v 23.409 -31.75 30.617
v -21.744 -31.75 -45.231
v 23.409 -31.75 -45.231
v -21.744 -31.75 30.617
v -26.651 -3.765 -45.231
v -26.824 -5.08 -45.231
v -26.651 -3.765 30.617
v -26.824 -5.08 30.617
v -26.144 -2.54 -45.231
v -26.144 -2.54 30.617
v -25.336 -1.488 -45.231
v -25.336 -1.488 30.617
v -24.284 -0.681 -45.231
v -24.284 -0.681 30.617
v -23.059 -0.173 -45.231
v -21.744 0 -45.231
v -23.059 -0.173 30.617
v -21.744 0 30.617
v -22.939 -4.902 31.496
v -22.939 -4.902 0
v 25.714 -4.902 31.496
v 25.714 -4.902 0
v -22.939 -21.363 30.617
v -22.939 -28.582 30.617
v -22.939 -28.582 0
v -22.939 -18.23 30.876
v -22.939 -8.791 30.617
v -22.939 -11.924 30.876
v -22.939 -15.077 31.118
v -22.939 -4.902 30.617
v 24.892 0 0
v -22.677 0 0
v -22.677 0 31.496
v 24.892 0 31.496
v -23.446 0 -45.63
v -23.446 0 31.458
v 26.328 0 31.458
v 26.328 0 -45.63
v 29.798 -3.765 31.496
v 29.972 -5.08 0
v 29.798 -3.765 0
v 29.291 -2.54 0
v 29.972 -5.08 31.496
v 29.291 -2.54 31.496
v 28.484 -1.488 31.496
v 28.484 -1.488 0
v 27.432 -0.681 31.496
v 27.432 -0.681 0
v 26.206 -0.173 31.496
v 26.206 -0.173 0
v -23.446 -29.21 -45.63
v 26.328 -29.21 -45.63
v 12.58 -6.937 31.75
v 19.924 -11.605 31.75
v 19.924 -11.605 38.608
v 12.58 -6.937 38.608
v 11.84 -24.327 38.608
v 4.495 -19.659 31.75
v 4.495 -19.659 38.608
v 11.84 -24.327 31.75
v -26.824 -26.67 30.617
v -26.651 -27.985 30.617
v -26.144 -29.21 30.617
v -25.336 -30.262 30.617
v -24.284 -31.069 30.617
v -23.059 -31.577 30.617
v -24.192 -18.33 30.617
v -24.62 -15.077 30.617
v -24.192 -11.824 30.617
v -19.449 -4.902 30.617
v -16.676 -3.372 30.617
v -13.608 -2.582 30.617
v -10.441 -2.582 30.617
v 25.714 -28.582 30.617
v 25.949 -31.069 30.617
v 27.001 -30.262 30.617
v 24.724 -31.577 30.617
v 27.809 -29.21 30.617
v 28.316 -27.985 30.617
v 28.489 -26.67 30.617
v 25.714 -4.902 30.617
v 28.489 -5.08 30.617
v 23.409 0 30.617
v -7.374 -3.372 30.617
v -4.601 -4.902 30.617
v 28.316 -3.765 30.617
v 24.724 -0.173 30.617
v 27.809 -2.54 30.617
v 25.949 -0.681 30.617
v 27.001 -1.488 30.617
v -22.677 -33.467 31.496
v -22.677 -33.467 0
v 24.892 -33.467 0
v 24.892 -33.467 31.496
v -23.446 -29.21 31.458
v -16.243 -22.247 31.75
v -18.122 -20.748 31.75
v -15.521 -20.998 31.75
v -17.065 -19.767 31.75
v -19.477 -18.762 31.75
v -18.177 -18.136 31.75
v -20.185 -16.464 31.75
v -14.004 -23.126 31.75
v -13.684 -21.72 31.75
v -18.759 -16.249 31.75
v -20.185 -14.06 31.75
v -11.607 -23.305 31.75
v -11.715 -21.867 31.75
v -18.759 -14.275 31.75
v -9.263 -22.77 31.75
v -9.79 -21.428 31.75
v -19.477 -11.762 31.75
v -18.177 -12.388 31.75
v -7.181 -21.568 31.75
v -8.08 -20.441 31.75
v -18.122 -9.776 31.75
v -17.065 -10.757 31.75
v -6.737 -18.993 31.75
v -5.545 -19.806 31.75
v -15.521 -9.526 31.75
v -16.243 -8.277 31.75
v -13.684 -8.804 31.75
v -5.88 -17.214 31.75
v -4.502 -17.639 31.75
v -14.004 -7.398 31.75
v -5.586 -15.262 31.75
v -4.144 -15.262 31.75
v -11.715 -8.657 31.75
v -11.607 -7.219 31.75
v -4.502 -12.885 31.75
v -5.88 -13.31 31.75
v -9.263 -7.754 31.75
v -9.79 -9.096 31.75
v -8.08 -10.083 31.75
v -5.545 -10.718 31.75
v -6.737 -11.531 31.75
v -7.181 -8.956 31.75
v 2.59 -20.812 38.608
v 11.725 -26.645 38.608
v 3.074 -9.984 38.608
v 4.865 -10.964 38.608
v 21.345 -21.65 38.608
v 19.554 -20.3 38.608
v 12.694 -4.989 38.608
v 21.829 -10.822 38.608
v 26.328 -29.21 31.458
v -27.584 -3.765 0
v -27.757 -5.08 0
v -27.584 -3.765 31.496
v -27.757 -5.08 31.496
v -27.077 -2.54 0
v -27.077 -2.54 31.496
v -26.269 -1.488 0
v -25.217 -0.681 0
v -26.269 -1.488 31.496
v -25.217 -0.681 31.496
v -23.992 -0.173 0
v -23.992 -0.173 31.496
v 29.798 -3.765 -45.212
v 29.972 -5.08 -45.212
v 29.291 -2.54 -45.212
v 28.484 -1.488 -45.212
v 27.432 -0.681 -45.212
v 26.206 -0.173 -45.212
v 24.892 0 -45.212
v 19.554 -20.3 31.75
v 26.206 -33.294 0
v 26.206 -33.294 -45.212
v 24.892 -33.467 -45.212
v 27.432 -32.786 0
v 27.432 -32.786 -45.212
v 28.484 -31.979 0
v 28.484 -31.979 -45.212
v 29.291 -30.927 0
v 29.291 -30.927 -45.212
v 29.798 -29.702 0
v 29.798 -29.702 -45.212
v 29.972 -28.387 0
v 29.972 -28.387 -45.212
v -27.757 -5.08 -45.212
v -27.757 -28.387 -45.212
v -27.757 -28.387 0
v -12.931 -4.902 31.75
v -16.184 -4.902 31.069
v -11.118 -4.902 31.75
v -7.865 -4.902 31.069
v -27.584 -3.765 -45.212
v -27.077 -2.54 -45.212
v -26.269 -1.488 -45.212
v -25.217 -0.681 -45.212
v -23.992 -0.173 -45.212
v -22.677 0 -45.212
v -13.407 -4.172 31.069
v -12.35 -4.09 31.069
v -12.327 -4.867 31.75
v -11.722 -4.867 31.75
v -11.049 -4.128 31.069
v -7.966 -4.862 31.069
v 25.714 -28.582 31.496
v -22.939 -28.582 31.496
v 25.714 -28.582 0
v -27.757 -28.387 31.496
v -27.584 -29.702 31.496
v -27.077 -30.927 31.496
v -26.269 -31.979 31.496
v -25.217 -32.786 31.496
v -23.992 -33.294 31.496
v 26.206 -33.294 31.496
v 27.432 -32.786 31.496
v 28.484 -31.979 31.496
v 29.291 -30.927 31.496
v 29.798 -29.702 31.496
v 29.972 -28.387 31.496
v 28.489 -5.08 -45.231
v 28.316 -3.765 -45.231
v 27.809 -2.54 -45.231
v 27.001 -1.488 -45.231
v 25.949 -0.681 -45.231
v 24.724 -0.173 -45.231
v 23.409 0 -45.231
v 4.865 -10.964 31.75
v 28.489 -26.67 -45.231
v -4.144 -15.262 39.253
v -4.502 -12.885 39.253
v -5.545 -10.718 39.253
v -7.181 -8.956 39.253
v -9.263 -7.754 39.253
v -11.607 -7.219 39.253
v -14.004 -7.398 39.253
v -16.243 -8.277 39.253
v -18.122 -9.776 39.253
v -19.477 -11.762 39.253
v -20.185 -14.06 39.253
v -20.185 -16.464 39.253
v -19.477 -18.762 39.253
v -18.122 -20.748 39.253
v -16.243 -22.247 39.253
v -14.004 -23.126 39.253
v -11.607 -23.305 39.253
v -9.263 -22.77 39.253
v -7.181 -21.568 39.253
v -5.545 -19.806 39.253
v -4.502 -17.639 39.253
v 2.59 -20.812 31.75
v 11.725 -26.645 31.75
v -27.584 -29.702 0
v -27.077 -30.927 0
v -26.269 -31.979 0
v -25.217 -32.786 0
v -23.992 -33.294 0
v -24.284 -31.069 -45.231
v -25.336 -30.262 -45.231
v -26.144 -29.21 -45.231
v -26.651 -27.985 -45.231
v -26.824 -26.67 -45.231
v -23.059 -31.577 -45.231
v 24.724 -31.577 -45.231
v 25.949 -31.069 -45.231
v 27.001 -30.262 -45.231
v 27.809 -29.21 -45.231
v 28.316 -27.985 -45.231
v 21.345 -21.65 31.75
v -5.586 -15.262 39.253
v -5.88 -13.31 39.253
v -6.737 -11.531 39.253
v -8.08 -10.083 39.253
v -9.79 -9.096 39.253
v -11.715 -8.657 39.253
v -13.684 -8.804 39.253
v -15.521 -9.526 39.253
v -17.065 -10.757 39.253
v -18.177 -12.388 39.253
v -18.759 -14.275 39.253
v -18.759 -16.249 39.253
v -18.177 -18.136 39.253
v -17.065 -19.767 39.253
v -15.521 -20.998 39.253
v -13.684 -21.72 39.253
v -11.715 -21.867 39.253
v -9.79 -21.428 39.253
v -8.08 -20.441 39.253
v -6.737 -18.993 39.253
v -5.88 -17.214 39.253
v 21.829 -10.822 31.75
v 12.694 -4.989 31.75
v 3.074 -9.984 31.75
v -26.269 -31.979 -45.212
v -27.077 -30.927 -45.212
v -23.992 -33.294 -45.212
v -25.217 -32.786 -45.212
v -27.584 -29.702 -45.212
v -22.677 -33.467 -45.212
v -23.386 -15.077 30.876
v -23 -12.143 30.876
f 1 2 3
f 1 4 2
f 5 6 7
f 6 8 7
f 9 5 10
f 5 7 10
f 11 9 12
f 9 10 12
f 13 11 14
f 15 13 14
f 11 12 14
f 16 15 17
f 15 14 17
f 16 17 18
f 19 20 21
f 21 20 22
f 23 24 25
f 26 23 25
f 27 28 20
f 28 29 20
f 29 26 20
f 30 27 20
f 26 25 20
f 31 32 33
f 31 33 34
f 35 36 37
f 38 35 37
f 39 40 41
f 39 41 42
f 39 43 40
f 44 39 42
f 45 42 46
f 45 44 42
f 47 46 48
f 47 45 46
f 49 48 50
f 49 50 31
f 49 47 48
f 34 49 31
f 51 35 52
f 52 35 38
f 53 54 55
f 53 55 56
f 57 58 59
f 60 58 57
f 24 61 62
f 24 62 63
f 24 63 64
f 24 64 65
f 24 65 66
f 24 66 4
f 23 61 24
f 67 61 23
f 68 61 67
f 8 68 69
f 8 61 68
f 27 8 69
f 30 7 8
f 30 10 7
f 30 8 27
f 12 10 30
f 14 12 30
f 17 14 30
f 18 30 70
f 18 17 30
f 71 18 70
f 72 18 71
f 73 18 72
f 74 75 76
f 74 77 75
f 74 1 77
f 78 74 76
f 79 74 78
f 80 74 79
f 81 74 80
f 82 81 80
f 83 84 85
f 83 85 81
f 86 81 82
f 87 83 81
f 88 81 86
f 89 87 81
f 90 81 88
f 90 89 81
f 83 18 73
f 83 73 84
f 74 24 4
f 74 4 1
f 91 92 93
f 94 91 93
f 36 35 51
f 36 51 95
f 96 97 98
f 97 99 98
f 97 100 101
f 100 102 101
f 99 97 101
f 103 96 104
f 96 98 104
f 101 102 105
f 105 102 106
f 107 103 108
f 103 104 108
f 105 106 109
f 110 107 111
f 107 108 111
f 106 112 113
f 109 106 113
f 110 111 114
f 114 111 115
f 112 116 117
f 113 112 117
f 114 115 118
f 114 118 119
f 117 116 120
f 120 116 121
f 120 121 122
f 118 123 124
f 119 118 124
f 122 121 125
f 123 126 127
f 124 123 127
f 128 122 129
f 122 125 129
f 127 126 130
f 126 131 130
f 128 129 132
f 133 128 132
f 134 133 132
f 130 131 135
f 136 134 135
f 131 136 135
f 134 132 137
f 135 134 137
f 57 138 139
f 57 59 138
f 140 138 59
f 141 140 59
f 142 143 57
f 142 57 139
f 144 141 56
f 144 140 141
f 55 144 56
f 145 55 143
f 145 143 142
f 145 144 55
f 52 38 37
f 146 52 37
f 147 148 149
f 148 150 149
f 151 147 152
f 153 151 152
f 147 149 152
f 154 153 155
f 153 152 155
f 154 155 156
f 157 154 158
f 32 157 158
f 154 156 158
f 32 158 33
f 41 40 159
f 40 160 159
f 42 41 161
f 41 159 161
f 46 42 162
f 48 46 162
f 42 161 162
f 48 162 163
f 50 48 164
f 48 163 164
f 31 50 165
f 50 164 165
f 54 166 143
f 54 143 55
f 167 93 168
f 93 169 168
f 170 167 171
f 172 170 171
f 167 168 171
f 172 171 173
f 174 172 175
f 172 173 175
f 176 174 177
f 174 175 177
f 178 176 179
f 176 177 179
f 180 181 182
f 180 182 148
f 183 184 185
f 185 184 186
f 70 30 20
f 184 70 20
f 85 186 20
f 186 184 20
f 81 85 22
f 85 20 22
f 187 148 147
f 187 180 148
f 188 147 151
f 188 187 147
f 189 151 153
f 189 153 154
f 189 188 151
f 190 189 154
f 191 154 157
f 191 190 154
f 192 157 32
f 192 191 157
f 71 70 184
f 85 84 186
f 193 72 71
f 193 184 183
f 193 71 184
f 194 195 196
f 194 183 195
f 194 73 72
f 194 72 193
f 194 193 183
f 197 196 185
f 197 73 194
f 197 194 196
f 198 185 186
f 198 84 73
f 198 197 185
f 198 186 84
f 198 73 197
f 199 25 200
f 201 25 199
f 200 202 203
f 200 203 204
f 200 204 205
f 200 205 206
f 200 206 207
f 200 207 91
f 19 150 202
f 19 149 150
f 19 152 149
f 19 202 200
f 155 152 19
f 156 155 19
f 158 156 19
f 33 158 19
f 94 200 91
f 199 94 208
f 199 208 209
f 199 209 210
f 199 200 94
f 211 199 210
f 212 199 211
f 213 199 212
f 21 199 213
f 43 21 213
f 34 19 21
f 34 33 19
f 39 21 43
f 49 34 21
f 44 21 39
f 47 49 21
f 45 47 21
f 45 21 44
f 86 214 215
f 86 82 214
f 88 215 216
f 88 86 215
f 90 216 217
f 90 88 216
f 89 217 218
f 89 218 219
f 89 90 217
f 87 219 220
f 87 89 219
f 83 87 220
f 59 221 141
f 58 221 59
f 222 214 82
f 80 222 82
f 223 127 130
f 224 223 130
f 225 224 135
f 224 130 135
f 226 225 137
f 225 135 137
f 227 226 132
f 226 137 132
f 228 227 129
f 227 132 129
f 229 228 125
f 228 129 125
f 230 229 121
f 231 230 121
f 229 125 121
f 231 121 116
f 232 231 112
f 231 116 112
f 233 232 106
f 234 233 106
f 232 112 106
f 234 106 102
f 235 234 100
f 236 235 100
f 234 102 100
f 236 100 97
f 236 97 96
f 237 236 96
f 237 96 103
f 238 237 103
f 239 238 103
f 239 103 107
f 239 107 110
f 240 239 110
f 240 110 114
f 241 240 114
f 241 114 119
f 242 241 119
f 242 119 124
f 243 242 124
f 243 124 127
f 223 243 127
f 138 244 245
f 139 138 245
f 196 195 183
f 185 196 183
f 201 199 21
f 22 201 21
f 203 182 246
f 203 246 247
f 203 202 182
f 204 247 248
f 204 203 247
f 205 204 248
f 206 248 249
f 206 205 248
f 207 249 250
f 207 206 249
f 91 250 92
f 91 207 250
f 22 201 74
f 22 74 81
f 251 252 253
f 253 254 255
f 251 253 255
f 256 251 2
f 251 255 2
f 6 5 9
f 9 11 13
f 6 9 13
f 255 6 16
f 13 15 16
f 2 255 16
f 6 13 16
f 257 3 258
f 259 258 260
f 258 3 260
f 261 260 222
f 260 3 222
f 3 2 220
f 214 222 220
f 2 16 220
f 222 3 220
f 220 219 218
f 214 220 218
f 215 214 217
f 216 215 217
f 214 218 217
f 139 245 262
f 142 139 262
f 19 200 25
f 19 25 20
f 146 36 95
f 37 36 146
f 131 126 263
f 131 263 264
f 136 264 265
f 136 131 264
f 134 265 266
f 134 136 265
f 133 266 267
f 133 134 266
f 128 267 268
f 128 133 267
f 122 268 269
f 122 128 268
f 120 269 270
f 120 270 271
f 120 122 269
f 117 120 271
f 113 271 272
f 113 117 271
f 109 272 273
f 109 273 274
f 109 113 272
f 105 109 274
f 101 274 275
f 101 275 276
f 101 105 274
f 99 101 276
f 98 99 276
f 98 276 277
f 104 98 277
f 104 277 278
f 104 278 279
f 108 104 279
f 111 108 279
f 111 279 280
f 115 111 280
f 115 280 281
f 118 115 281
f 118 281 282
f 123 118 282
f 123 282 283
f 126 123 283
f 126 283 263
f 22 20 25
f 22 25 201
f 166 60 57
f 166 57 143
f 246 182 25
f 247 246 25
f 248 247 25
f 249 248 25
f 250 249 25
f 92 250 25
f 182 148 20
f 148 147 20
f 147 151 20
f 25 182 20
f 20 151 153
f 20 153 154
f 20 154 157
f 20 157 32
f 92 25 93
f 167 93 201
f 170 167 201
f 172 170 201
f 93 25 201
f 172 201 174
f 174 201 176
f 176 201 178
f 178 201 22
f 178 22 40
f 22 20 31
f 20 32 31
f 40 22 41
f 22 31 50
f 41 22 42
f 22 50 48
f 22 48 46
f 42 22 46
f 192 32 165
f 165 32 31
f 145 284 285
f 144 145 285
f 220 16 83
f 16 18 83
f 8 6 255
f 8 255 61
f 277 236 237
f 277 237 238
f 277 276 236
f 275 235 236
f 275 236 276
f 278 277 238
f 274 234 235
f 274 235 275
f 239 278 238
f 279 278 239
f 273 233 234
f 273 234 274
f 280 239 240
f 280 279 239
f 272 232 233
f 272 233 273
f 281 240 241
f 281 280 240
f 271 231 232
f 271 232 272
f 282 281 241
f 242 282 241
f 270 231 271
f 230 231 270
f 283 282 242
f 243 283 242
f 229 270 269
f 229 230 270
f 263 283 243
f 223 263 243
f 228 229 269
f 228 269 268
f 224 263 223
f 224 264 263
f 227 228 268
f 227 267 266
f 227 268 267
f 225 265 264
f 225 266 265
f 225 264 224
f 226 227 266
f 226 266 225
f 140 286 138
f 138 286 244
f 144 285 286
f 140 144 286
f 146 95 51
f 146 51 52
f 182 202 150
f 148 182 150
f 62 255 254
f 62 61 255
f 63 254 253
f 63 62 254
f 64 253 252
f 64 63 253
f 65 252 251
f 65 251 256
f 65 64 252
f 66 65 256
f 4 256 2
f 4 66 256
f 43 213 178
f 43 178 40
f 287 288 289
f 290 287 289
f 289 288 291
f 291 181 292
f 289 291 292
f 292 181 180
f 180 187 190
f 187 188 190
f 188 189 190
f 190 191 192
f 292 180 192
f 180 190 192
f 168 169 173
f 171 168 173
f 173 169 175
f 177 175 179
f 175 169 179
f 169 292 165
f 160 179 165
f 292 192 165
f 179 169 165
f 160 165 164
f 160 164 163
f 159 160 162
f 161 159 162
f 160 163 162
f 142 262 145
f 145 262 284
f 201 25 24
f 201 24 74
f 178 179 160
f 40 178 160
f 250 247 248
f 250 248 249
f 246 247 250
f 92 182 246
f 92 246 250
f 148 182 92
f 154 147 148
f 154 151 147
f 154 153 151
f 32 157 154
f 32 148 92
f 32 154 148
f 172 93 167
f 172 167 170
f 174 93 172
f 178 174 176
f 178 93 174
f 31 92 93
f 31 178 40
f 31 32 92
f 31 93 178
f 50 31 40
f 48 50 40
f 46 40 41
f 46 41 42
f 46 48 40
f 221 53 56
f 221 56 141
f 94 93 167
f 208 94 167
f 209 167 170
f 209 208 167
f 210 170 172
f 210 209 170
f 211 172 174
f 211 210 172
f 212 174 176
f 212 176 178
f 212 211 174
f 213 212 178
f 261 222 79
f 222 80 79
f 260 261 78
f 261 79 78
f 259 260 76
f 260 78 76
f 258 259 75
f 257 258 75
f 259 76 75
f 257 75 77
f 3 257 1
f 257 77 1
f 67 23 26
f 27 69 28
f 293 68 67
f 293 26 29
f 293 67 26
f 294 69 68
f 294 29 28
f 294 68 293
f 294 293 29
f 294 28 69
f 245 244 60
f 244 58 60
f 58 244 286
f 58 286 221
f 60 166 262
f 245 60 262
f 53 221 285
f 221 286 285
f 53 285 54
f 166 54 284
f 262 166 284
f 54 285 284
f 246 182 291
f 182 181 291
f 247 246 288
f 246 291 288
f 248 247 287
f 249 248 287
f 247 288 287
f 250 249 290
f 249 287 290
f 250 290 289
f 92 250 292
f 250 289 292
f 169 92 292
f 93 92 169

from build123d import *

# Parameters (mm, degrees)
F0_W      = 55.313270539
F0_H      = 75.847633183
F1_DEPTH  = 31.75
F2_R      = 5.08
F3_R      = 8.0658325131
F3_R_2    = 6.6237237861
F4_DEPTH  = 8.636
F5_R      = 10.2149655363
F6_DEPTH  = 31.75
F9_DEPTH  = 38.608
F11_DEPTH = 38.862
F13_DEPTH = 27.94
F14_W     = 57.7289052308
F14_H     = 33.4668345749
F15_DEPTH = 31.496
F16_DEPTH = 45.212
F17_R     = 5.08
F17_2_R   = 5.08
F18_W     = 48.6534815282
F18_H     = 23.6792610958
F19_DEPTH = 31.75
F20_W     = 49.7737694532
F20_H     = 77.0872496068
F21_DEPTH = 29.21


# Not quite as in the source:
# - a fillet or chamfer that OpenCascade refuses, or shapes differently, is made with other operations: its cross-section is extruded or revolved along the edge and cut away or added


with BuildPart() as f1:
    # F0 (on Front) → F1 (new body)
    with BuildSketch(Plane.XZ):
        with Locations((0.8324738592, -7.3072724044)):
            Rectangle(F0_W, F0_H)
    extrude(amount=F1_DEPTH)

    # F2
    f2_edges = [f1.edges().sort_by_distance(p)[0] for p in [
        (28.489109, -31.75, -7.307272),
        (-26.824161, -31.75, -7.307272),
        (28.489109, 0, -7.307272),
        (-26.824161, 0, -7.307272),
    ]]
    fillet(f2_edges, radius=F2_R)



with BuildPart() as f4:
    # F3 (on face) → F4 (new body)
    with BuildSketch(Plane.XY.offset(30.6165441871)):
        with Locations((-12.2096184641, -15.2620235458)):
            Circle(F3_R)
        with Locations((-12.2096184641, -15.2620235458)):
            Circle(F3_R_2, mode=Mode.SUBTRACT)
    extrude(amount=F4_DEPTH)


with BuildPart() as f1_1:
    add(f1.part)

    add(f4.part)  # F6 merges F4
    # F5 (on Top) → F6 (join)
    with BuildSketch(Plane.XY):
        with Locations((-12.0246242732, -15.0770293549)):
            Circle(F5_R)
    extrude(amount=F6_DEPTH)

    # F7: fillet of radius 3.0660512242 on 1 edges, made by hand

    # F7_s1 → F7_t2 (revolve)
    with BuildSketch(Plane.XZ.offset(15.0770293549)):
        with BuildLine():
            ThreePointArc((-1.8096587369, 31.75), (-0.7475631061, 30.9143733613), (0.5706238273, 30.6165441871))
            Line((0.5706238273, 30.6165441871), (-1.8096587369, 30.6165441871))
            Line((-1.8096587369, 30.6165441871), (-1.8096587369, 31.75))
        make_face()
    revolve(axis=Axis((-12.0246242732, -15.0770293549, 30.6165441871), (0, 0, -1)))

    # F8 (on Top) → F9 (join)
    with BuildSketch(Plane.XY):
        Polygon((21.3451305674, -21.6504897434), (21.8293182552, -10.8221620321), (12.6938052206, -4.9886793386), (3.0741044982, -9.9835243564), (2.5899168104, -20.8118520677), (11.725429845, -26.6453347612), align=None)
    extrude(amount=F9_DEPTH)

    # F10 (on Top) → F11 (cut)
    with BuildSketch(Plane.XY):
        Polygon((19.9244704443, -11.6050673129), (12.5796077773, -6.9372830912), (4.8647567285, -10.9642286373), (4.4947683466, -19.6589584051), (11.8396310136, -24.3267426267), (19.5544820624, -20.2997970807), align=None)
    extrude(amount=F11_DEPTH, mode=Mode.SUBTRACT)

    # F12 (on Top) → F13 (join)
    with BuildSketch(Plane.XY):
        Polygon((19.2986911239, -20.0054645374), (19.7943821549, -11.7471329868), (12.8903027548, -7.1886861861), (5.4905323236, -10.8885709361), (4.9948412925, -19.1469024867), (11.8989206926, -23.7053492873), align=None)
    extrude(amount=F13_DEPTH)


with BuildPart() as f15:
    # F14 (on Top) → F15 (new body)
    with BuildSketch(Plane.XY):
        with Locations((1.1070892215, -16.7334172875)):
            Rectangle(F14_W, F14_H)
    extrude(amount=F15_DEPTH)

    # F17
    f17_edges = [f15.edges().sort_by_distance(p)[0] for p in [
        (29.971542, -33.466835, 15.748),
        (-27.757363, -33.466835, 15.748),
        (-27.757363, 0, 15.748),
        (29.971542, 0, 15.748),
    ]]
    fillet(f17_edges, radius=F17_R)


with BuildPart() as f16:
    # F14 (on Top) → F16 (new body)
    with BuildSketch(Plane.XY):
        with Locations((1.1070892215, -16.7334172875)):
            Rectangle(F14_W, F14_H)
    extrude(amount=-F16_DEPTH)

    # F17#2
    f17_2_edges = [f16.edges().sort_by_distance(p)[0] for p in [
        (29.971542, -33.466835, -22.606),
        (-27.757363, -33.466835, -22.606),
        (-27.757363, 0, -22.606),
        (29.971542, 0, -22.606),
    ]]
    fillet(f17_2_edges, radius=F17_2_R)


with BuildPart() as f19_tool:
    # F18 (on Top) → F19 (new body)
    with BuildSketch(Plane.XY):
        with Locations((1.3874573633, -16.7419775389)):
            Rectangle(F18_W, F18_H)
    extrude(amount=F19_DEPTH)


with BuildPart() as f1_2:
    add(f1_1.part)

    # F19: cut by f19_tool
    add(f19_tool.part, mode=Mode.SUBTRACT)


with BuildPart() as f15_1:
    add(f15.part)

    # F19: cut by f19_tool
    add(f19_tool.part, mode=Mode.SUBTRACT)


with BuildPart() as f21:
    # F20 (on Front) → F21 (new body)
    with BuildSketch(Plane.XZ):
        with Locations((1.4411928132, -7.0859994739)):
            Rectangle(F20_W, F20_H)
    extrude(amount=F21_DEPTH)


solid = Compound([f16.part, f1_2.part, f15_1.part, f21.part])
